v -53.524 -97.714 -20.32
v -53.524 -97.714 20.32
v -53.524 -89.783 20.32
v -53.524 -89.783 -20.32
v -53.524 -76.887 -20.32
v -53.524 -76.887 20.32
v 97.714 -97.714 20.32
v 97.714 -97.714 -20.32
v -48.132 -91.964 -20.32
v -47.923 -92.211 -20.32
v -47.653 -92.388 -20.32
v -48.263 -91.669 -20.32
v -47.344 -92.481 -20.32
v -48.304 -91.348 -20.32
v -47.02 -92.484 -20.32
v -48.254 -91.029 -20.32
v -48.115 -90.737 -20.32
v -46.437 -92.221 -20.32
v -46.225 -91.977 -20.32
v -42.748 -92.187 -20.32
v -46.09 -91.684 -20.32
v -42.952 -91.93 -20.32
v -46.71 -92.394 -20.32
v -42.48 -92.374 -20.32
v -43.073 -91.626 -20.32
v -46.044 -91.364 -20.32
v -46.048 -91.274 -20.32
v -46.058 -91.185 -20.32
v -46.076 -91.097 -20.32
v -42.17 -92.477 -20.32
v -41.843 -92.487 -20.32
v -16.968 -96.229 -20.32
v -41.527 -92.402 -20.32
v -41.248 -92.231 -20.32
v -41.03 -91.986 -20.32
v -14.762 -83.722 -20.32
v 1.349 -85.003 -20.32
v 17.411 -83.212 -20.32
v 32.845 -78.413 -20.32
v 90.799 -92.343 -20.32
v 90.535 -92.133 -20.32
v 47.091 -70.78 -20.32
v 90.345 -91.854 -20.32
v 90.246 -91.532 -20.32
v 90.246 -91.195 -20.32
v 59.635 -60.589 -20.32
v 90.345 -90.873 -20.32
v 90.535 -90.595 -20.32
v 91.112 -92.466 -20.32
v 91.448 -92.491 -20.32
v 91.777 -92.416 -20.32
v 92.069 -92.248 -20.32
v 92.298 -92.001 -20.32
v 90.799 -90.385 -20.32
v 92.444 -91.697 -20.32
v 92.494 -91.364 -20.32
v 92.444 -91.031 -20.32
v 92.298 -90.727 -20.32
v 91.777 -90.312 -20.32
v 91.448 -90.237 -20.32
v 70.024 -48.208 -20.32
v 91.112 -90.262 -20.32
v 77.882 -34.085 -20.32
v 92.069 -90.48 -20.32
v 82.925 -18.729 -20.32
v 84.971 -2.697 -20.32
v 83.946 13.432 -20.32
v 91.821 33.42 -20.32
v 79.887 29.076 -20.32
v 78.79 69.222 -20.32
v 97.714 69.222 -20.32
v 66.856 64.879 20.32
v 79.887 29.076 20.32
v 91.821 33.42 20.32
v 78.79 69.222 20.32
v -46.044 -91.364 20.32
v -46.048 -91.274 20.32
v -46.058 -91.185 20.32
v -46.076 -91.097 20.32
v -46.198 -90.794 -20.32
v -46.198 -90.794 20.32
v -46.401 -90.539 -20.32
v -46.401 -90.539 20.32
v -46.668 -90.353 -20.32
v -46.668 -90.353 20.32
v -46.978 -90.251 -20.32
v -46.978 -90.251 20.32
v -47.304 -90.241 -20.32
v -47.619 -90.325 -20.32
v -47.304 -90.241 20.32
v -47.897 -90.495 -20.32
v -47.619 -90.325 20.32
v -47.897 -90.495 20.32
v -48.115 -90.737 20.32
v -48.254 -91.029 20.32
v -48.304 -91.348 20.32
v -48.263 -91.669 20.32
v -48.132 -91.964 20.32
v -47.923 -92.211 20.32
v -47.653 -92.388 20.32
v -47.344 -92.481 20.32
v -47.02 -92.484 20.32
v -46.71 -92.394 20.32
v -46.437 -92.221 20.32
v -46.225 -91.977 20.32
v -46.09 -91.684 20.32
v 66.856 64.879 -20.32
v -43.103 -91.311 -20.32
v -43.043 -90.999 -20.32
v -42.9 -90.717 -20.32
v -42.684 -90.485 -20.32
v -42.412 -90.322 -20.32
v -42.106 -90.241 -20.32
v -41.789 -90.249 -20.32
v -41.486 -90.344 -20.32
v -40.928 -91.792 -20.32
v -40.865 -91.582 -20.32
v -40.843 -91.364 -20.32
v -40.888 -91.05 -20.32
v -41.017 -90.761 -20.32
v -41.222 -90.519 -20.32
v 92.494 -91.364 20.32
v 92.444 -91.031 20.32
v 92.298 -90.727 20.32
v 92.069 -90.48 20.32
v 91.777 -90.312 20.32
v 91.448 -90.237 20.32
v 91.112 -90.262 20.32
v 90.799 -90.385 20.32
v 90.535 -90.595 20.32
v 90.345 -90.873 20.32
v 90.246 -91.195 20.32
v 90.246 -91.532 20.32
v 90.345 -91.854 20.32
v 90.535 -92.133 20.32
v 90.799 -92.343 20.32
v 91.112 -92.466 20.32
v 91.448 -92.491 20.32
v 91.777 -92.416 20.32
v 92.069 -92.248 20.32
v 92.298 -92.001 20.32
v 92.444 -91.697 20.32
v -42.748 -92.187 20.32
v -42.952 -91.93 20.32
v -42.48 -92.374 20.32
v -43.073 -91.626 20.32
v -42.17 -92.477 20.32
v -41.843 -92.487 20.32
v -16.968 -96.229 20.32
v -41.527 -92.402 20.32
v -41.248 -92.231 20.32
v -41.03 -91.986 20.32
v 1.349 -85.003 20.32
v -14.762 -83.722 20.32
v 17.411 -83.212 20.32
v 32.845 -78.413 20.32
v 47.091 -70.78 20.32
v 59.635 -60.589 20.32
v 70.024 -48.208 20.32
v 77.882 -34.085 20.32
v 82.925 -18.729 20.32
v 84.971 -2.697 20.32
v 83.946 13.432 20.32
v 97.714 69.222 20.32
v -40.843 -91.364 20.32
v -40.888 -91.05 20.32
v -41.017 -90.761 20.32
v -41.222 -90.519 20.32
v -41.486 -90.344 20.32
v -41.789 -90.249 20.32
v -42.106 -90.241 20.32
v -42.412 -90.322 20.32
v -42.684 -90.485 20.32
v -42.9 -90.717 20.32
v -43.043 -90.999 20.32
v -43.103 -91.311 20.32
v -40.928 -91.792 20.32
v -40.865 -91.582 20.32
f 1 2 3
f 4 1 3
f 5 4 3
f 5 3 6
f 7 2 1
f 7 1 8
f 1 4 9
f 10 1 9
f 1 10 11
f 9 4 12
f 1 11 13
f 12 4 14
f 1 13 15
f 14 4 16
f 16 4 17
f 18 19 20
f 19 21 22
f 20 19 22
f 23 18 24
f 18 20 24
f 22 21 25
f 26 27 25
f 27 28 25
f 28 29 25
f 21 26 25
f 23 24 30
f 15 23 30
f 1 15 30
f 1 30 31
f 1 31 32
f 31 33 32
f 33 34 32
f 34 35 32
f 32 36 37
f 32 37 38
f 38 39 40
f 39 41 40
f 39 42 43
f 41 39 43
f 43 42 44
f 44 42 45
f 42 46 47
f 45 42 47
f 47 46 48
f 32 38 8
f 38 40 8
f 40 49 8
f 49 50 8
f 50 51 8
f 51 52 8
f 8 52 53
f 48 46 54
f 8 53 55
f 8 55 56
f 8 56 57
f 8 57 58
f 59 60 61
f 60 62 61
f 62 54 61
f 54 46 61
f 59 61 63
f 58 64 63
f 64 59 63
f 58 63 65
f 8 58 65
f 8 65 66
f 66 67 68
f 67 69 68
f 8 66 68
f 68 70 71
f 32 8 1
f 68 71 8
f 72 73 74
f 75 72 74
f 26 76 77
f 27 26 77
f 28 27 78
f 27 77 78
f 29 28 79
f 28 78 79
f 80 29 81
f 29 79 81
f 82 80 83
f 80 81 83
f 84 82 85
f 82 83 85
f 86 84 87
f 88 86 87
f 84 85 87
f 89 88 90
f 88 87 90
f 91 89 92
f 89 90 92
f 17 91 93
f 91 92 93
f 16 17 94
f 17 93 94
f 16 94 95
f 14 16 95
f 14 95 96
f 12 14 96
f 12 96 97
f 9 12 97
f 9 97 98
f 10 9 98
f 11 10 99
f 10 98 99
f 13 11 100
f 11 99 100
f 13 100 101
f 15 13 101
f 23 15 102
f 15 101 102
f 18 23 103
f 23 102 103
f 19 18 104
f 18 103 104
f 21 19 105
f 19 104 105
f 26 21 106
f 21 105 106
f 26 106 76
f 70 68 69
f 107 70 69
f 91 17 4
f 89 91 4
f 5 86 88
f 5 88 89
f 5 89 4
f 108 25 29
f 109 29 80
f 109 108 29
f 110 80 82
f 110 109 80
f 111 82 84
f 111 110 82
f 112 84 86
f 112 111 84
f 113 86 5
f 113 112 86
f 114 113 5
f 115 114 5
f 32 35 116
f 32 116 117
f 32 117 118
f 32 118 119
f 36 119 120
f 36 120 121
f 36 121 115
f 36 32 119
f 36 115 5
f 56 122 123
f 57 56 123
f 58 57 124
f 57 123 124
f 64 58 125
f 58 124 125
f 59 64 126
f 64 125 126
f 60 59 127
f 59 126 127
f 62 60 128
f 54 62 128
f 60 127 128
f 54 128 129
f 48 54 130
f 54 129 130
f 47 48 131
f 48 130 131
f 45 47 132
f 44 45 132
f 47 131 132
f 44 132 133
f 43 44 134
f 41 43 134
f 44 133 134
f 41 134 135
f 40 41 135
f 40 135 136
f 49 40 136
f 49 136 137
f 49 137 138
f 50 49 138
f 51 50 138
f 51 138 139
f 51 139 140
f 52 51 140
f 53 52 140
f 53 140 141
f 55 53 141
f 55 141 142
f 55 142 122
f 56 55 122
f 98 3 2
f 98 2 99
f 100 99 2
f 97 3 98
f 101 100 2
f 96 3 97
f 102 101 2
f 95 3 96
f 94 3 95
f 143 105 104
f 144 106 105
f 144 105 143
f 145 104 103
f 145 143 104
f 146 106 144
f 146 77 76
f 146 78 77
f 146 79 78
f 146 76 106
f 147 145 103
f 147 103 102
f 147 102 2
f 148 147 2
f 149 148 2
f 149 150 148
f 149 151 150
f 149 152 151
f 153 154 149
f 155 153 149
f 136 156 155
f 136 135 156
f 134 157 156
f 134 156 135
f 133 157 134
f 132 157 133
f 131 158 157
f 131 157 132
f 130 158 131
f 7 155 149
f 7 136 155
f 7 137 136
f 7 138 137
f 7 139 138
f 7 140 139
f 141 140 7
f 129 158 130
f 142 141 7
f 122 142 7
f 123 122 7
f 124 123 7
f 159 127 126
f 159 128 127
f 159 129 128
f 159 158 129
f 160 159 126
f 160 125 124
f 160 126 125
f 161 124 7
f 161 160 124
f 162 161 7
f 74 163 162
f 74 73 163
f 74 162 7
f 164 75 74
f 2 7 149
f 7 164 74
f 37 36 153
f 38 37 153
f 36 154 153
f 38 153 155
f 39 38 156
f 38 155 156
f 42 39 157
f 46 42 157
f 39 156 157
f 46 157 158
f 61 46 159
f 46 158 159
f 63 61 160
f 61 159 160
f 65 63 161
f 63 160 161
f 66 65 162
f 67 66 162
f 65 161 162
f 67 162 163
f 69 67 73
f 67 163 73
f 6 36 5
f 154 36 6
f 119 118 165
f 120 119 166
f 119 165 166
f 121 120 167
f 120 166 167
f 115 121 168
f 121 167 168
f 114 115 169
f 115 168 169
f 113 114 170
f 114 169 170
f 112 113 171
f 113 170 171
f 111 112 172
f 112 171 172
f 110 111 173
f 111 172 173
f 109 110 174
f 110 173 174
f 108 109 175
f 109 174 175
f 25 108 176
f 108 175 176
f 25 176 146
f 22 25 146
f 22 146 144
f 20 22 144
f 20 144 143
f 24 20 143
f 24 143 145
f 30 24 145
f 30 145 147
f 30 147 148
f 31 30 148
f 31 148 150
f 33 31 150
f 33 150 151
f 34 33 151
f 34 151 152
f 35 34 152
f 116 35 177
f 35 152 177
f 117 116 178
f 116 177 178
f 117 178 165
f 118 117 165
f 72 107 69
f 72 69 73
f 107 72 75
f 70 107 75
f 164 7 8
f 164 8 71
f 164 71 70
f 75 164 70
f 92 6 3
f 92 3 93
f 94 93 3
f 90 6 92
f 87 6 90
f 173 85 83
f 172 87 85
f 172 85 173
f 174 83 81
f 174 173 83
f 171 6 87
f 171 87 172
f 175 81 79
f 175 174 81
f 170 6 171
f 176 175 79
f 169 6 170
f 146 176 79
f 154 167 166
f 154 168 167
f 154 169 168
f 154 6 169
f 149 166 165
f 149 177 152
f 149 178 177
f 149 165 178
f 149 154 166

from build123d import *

# Parameters (mm, degrees)
BOSS_EXTRUDE1_DEPTH = 40.64
SKETCH6_R           = 1.1303
CUT_EXTRUDE1_DEPTH  = 158.779215984
SKETCH7_W           = 73.663303239
SKETCH7_H           = 73.66330324
CUT_EXTRUDE2_DEPTH  = 158.779215984
SKETCH8_R           = 1.1303
CUT_EXTRUDE3_DEPTH  = 145.040213208


with BuildPart() as part:
    # Sweep3: sweep along a path in Sketch2
    with BuildLine(Plane.XY) as sweep3_path:
        Line((-111.378641457, -46.568583299), (-11.322173751, -64.21123815))
        ThreePointArc((-11.322173751, -64.21123815), (49.947476571, -41.910909169), (61.269650322, 22.300328981))
        Line((61.269650322, 22.300328981), (48.238682861, 58.102617833))
    # 3DSketch1 → Sweep3 (sweep)
    with BuildSketch(Plane(origin=(-117.024291009, -78.586652965, -20.32), x_dir=(0.051794909001673446, 0.2937435257699459, 0.9544799780350292), z_dir=(0.984807753012208, -0.17364817766693055, 0))):
        Polygon((0, 0), (3.788092413, -12.121895721), (42.57815872, 0), (38.790066307, 12.121895721), align=None)
    sweep(path=sweep3_path.line)

    # Sketch5 → Boss-Extrude1 (add)
    with BuildSketch(Plane.XY.offset(20.32)):
        with BuildLine():
            Line((-16.967823303, -96.229307816), (-117.024291009, -78.586652965))
            Line((-117.024291009, -78.586652965), (-117.024291009, -97.7138))
            Line((-117.024291009, -97.7138), (-2e-08, -97.7138))
            ThreePointArc((-2e-08, -97.7138), (-8.516318826, -97.34196949), (-16.967823303, -96.229307816))
        make_face()
        with BuildLine():
            ThreePointArc((97.7138, 6e-08), (69.09409061, -69.094090581), (-2e-08, -97.7138))
            Line((-2e-08, -97.7138), (97.7138, -97.7138))
            Line((97.7138, -97.7138), (97.7138, 6e-08))
        make_face()
        with BuildLine():
            ThreePointArc((91.820936809, 33.420087881), (96.229307811, 16.967823332), (97.7138, 6e-08))
            Line((97.7138, 6e-08), (97.7138, 69.222376733))
            Line((97.7138, 69.222376733), (78.789969348, 69.222376733))
            Line((78.789969348, 69.222376733), (91.820936809, 33.420087881))
        make_face()
    extrude(amount=-BOSS_EXTRUDE1_DEPTH)

    # Sketch6 → Cut-Extrude1 (cut, through all)
    with BuildSketch(Plane.XY.offset(20.32)):
        with Locations((91.3638, -91.3638)):
            Circle(SKETCH6_R)
        with Locations((-41.9735, -91.3638)):
            Circle(SKETCH6_R)
    extrude(amount=-CUT_EXTRUDE1_DEPTH, mode=Mode.SUBTRACT)

    # Sketch7 → Cut-Extrude2 (cut, through all)
    with BuildSketch(Plane.XY.offset(20.32)):
        with Locations((-90.355942629, -60.88214838)):
            Rectangle(SKETCH7_W, SKETCH7_H)
    extrude(amount=-CUT_EXTRUDE2_DEPTH, mode=Mode.SUBTRACT)

    # Sketch8 → Cut-Extrude3 (cut, through all)
    with BuildSketch(Plane.XY.offset(20.32)):
        with Locations((-47.174291009, -91.3638)):
            Circle(SKETCH8_R)
    extrude(amount=-CUT_EXTRUDE3_DEPTH, mode=Mode.SUBTRACT)


solid = part.part
